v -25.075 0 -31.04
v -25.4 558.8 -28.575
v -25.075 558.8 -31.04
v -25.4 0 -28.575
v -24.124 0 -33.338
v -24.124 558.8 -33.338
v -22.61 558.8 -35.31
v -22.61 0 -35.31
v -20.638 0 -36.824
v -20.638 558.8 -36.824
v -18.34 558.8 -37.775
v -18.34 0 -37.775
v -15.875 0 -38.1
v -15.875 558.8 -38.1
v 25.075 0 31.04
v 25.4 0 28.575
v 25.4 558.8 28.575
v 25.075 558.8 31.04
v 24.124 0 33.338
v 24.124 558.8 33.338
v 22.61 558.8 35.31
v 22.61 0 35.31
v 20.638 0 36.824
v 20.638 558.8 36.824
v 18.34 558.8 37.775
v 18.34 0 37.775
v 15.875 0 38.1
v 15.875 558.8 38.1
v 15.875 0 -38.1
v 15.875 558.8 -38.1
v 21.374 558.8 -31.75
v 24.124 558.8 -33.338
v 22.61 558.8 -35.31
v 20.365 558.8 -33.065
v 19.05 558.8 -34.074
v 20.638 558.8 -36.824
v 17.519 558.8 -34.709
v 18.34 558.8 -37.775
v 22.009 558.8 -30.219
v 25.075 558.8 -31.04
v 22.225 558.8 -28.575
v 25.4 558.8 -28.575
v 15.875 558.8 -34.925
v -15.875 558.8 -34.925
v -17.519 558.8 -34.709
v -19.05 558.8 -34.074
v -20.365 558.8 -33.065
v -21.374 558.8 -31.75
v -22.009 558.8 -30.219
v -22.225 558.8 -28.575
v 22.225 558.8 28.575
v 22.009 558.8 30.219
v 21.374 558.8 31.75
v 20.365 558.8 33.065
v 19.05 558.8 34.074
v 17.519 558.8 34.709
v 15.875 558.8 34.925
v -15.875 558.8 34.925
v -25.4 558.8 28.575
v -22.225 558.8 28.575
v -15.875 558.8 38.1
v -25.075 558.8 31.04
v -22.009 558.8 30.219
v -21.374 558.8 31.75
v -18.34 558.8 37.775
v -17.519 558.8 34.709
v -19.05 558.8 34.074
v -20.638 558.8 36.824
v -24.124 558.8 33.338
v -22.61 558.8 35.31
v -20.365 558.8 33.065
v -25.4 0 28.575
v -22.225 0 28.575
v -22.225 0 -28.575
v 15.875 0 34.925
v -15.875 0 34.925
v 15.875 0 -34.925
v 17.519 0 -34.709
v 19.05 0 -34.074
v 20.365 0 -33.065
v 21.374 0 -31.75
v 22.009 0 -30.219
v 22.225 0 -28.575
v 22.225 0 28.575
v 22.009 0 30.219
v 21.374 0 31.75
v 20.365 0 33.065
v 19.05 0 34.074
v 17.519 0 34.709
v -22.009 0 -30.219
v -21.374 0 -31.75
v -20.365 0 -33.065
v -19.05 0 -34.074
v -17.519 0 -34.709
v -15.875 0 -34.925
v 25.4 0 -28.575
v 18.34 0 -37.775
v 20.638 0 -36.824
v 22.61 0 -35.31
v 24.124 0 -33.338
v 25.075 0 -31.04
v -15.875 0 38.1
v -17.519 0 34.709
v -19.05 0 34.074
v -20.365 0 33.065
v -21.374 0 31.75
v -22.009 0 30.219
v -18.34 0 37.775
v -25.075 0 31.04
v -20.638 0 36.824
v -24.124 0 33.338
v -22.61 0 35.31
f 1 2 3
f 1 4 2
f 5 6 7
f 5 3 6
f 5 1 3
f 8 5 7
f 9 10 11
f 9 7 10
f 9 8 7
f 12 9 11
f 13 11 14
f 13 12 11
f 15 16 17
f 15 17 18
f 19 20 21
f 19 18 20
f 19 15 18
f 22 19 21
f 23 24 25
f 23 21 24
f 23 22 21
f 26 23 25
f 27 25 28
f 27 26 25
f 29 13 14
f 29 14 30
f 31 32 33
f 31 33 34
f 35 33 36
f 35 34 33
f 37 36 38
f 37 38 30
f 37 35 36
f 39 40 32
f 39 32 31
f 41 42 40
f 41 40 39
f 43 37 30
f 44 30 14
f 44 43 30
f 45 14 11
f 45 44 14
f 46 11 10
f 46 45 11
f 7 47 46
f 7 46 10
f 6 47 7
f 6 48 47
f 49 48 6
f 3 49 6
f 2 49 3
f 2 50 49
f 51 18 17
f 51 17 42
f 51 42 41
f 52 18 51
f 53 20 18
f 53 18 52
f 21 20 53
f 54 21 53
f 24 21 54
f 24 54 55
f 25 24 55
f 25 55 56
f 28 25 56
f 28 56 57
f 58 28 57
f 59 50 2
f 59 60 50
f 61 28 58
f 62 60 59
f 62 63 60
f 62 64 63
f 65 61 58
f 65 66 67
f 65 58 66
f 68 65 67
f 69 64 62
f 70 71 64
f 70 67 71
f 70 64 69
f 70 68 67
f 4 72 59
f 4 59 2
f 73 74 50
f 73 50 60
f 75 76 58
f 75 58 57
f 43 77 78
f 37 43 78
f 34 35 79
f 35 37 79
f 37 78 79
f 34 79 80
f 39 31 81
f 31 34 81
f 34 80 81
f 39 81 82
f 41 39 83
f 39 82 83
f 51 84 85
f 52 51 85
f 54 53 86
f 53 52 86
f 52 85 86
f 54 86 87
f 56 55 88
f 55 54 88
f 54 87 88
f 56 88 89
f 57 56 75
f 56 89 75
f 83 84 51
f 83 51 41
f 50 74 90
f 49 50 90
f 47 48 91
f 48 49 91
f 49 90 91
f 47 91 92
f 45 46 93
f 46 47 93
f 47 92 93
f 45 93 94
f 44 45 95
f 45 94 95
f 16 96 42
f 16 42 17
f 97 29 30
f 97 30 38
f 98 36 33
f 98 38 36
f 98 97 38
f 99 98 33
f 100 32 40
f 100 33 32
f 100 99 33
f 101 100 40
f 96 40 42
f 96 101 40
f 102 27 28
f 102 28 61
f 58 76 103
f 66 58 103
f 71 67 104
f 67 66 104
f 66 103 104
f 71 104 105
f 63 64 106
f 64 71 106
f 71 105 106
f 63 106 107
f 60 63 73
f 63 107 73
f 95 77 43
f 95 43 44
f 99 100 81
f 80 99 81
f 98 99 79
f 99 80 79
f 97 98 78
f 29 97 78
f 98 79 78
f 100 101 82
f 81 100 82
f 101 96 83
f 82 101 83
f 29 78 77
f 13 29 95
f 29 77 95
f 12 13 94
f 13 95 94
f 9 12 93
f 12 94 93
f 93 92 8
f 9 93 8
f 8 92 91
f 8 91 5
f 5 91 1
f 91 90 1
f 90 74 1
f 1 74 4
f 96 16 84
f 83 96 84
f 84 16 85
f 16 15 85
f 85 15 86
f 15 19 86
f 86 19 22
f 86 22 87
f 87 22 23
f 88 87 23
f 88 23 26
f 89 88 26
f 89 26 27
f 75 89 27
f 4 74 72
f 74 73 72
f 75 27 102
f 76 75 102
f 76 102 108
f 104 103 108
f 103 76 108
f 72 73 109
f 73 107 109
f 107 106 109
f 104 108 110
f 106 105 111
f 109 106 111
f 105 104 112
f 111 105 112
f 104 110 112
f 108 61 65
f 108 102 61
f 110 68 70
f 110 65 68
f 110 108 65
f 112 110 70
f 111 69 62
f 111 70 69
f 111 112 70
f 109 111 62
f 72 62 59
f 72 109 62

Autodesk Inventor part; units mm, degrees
ref_plane "YZ Plane" through (0, 0, 0) normal (1, 0, 0) x (0, 1, 0)
ref_plane "XZ Plane" through (0, 0, 0) normal (0, 1, 0) x (-1, 0, 0)
ref_plane "XY Plane" through (0, 0, 0) normal (0, 0, 1) x (1, 0, 0)
sketch "Sketch1" plane through (0, 0, 0) normal (0, 1, 0) x (-1, 0, 0)
  line L0 (-15.875, 38.1) -> (15.875, 38.1)
  line L1 (25.4, 28.575) -> (25.4, -28.575)
  line L2 (15.875, -38.1) -> (-15.875, -38.1)
  line L3 (-25.4, -28.575) -> (-25.4, 28.575)
  line L4 (-25.4, 38.1) -> (25.4, -38.1) construction
  line L5 (25.4, 38.1) -> (-25.4, -38.1) construction
  arc A0 (25.4, 28.575) -> (15.875, 38.1) centre (15.875, 28.575) ccw
  arc A1 (-15.875, 38.1) -> (-25.4, 28.575) centre (-15.875, 28.575) ccw
  arc A2 (-25.4, -28.575) -> (-15.875, -38.1) centre (-15.875, -28.575) ccw
  arc A3 (15.875, -38.1) -> (25.4, -28.575) centre (15.875, -28.575) ccw
  line L6 (22.225, -28.575) -> (22.225, 28.575)
  arc A4 (22.225, 28.575) -> (15.875, 34.925) centre (15.875, 28.575) ccw
  line L7 (15.875, 34.925) -> (-15.875, 34.925)
  arc A5 (-15.875, 34.925) -> (-22.225, 28.575) centre (-15.875, 28.575) ccw
  line L8 (-22.225, 28.575) -> (-22.225, -28.575)
  arc A6 (-22.225, -28.575) -> (-15.875, -34.925) centre (-15.875, -28.575) ccw
  line L9 (-15.875, -34.925) -> (15.875, -34.925)
  arc A7 (15.875, -34.925) -> (22.225, -28.575) centre (15.875, -28.575) ccw
  point P0 (0, 0)
  dimension "d0" = 50.8
  dimension "d1" = 76.2
  dimension "d2" = 9.525
  dimension "d3" = 3.175
extrude "Extrusion1" add sketch "Sketch1" along normal blind 558.8
equation "\"d0\" = stockHeight"
equation "\"d1\" = stockWidth"
equation "\"d2\" = stockRad"
equation "\"d3\" = stockGuage"
equation "\"height\" = 203.2"
equation "\"shaftDiam\" = 6.35"
equation "\"shaftSpace\" = 1.5875"
equation "\"stageSpace\" = 2.54"
equation "\"stageAngle\" = 15deg"
equation "\"stockHeight\" = 50.8"
equation "\"stockWidth\" = 76.2"
equation "\"stockRad\" = 9.525"
equation "\"stockGuage\" = 3.175"
equation "\"groundActu\" = 304.8"
equation "\"baseWidth\" = 1066.8"
equation "\"baseDepth\" = 254"
equation "\"capThickness\" = 3.175"
equation "\"sup1Ang\" = 22.619865deg"
equation "\"sup1Len\" = 660.4"
equation "\"supVertLen\" = 955.13561"
equation "\"sup2Ang\" = 8.959949deg"
equation "\"sup2Len\" = 2079.37366"
equation "\"supSideAng\" = 19.376933deg"
equation "\"supSideLen\" = 1531.12879"
equation "\"FlangeDiam\" = 12.7"
equation "\"bearingDiam\" = 9.5504"
equation "\"FlangeDepth\" = 1.5875"
equation "\"smallFilet\" = 0.39687"
equation "\"thickness\" = 12.7"
equation "\"ringDiam\" = 96.46608"
properties part number "vertical bar" material "Aluminum 6061"
